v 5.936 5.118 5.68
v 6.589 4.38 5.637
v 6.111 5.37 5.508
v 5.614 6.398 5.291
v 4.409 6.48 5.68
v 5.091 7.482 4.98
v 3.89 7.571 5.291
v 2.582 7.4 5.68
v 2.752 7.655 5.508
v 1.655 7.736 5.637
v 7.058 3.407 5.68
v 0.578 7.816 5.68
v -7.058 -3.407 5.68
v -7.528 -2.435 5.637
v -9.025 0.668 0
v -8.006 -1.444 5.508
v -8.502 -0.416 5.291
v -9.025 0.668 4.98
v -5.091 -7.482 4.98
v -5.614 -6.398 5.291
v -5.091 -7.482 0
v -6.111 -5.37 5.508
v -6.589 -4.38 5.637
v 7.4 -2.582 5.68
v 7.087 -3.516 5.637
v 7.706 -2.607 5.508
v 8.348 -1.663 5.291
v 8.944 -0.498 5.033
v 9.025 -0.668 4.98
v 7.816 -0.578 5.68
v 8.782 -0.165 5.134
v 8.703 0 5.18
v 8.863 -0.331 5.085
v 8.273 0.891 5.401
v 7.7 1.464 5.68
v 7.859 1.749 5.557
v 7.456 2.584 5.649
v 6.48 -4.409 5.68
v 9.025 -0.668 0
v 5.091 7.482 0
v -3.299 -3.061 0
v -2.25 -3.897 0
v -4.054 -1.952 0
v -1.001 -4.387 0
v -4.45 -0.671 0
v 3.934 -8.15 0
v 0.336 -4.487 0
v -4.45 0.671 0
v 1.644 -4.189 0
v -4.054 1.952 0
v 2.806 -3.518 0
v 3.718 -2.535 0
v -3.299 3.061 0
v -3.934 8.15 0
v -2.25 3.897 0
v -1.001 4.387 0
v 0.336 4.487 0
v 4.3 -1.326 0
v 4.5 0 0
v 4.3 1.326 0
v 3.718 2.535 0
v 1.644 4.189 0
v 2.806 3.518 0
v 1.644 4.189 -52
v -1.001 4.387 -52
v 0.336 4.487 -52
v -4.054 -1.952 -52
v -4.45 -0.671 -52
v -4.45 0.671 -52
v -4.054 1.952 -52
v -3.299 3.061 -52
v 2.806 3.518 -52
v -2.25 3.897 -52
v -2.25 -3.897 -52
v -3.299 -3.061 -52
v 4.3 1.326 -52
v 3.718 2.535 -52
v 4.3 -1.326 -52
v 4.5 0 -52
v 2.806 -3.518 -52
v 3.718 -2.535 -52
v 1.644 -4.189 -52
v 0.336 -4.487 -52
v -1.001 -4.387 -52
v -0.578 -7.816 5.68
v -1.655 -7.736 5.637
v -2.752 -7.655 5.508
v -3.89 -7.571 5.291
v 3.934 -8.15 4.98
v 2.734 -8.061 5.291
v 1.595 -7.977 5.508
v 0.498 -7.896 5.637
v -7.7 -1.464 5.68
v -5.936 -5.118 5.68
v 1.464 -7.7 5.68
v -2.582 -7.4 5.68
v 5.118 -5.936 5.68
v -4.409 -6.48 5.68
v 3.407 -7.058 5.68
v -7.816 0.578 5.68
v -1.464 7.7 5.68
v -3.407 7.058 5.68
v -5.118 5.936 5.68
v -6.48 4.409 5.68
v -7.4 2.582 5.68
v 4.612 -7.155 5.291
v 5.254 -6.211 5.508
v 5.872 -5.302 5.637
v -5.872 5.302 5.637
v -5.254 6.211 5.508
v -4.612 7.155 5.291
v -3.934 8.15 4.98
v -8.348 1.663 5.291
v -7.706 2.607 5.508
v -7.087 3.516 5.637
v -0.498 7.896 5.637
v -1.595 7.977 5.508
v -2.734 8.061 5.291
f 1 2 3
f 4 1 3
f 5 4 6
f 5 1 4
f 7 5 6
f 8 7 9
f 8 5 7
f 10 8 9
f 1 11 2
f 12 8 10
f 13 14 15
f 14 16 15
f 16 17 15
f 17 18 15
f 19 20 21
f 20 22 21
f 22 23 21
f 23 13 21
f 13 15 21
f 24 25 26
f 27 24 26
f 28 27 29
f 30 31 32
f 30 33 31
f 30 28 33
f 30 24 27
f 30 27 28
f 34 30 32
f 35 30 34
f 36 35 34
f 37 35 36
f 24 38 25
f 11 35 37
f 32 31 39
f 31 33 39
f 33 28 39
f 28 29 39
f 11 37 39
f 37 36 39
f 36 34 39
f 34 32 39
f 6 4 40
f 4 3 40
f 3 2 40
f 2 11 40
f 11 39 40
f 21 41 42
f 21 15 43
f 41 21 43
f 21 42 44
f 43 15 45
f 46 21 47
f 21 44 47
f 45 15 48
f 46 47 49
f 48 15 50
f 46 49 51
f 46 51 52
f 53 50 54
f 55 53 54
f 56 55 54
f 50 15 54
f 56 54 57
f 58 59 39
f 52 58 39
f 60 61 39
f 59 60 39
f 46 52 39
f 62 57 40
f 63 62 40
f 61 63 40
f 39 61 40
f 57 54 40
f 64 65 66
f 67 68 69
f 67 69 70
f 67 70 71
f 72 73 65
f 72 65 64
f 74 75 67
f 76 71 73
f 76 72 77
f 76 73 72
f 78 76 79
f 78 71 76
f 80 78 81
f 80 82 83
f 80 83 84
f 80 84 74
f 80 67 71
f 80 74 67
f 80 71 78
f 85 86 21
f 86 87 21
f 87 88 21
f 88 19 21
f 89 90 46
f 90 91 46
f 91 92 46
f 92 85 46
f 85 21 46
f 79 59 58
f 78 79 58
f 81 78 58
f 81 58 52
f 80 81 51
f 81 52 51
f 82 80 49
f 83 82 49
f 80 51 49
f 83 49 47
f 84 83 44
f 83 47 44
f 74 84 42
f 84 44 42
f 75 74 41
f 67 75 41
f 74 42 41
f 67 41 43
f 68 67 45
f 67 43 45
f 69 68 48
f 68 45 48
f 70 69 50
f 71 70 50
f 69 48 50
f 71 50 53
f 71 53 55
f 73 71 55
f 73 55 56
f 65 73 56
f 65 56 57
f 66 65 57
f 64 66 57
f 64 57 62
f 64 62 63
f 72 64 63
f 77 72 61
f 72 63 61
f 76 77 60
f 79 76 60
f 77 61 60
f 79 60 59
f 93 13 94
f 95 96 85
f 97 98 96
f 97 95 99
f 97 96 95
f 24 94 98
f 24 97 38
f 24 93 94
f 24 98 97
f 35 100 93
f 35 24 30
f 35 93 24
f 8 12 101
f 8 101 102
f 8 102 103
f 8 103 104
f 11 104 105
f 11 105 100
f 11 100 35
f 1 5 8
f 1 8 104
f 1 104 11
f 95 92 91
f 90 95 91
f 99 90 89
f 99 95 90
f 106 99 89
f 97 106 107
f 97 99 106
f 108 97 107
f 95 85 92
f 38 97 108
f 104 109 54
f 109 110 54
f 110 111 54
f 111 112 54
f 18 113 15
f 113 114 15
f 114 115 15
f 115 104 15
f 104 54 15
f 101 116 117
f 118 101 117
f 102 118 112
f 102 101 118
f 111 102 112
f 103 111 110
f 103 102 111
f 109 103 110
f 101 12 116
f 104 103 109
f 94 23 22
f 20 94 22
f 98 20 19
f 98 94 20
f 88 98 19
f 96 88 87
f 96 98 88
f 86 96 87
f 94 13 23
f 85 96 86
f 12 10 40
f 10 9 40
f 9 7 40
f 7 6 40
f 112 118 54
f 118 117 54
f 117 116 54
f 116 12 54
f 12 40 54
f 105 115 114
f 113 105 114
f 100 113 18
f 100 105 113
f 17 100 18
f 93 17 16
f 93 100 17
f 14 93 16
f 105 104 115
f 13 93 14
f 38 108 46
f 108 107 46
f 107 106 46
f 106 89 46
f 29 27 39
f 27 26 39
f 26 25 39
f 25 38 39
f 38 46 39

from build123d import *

# Parameters (mm, degrees)
BOSS_EXTRUDE1_DEPTH = 5.68
SKETCH2_OUTSIDE_W   = 44.722
SKETCH2_OUTSIDE_H   = 42.972
SKETCH2_OUTSIDE_R   = 7.837529904
CUT_EXTRUDE1_DEPTH  = 5.68
CUT_EXTRUDE1_DRAFT  = -60
SKETCH3_R           = 4.5
BOSS_EXTRUDE2_DEPTH = 52


with BuildPart() as part:
    # Sketch1 → Boss-Extrude1 (new body)
    with BuildSketch(Plane.XY):
        Polygon((5.091015355, 7.482249839), (-3.934310761, 8.150073548), (-9.025326116, 0.667823708), (-5.091015355, -7.482249839), (3.934310761, -8.150073548), (9.025326116, -0.667823708), align=None)
    extrude(amount=BOSS_EXTRUDE1_DEPTH)


with BuildPart() as cut_extrude1_tool:
    # Sketch2 outside → Cut-Extrude1 (with draft: the straight prism first)
    with BuildSketch(Plane.XY.offset(5.68)):
        Rectangle(SKETCH2_OUTSIDE_W, SKETCH2_OUTSIDE_H)
        Circle(SKETCH2_OUTSIDE_R, mode=Mode.SUBTRACT)
    extrude(amount=-CUT_EXTRUDE1_DEPTH)
    # Cut-Extrude1: the draft: its side faces are tilted about the plane it starts from
    cut_extrude1_sides = [cut_extrude1_tool.faces().sort_by_distance(p)[0] for p in [
        (0, -21.486, 2.84),
        (22.361, 0, 2.84),
        (0, 21.486, 2.84),
        (-22.361, 0, 2.84),
        (-7.837529904, 0, 2.84),
    ]]
    draft(cut_extrude1_sides, Plane.XY.offset(5.68), CUT_EXTRUDE1_DRAFT)


with BuildPart() as part_1:
    add(part.part)

    # Cut-Extrude1: cut by cut_extrude1_tool
    add(cut_extrude1_tool.part, mode=Mode.SUBTRACT)

    # Sketch3 → Boss-Extrude2 (add)
    with BuildSketch(Plane(origin=(0, 0, 0), x_dir=(-1, 0, 0), z_dir=(0, 0, -1))):
        with Locations(Location((0, 0, 0), (0, 0, 180))):
            Circle(SKETCH3_R)
    extrude(amount=BOSS_EXTRUDE2_DEPTH)


solid = part_1.part
